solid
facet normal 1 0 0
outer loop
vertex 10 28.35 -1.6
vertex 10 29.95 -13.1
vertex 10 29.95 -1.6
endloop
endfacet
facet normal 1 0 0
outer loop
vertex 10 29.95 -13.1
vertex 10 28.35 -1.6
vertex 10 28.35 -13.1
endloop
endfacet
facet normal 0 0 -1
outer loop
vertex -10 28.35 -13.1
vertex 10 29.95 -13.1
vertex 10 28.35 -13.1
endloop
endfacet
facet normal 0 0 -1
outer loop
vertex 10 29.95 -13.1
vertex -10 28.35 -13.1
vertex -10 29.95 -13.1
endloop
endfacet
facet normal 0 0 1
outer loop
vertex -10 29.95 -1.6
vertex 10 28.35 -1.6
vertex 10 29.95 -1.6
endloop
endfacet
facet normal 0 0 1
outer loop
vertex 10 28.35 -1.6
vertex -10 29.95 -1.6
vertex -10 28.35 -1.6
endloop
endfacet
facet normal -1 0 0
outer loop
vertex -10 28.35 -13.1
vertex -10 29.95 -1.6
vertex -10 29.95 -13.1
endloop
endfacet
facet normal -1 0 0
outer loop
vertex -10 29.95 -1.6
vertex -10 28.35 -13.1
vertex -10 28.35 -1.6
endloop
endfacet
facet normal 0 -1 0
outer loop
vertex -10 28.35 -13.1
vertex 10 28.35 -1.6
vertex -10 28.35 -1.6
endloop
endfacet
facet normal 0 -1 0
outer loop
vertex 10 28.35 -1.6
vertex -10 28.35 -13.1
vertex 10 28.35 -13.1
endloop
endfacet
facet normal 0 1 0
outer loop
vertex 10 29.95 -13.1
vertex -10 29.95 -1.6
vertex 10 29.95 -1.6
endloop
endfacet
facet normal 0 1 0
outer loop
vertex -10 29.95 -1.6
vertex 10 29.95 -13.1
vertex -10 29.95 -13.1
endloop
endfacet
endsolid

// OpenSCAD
    // MixTape 3d Printed Case///////////////////////////

plugHeight = 10.5; // [6:10]
tapeHeight = 11.5; //
topThickness = 2; 

usb_charger = false;
front_charger = false;
cutout_aux_ports = true;

rotate([180,0,$t*380]) translate([-50,-30,0]){

//PCB();
//parts();

difference(){
    
    FullCase();
    
    // Plugs 
    translate([2.5,50,tapeHeight-plugHeight+topThickness]) cube([13,20,plugHeight+1],false); 
    translate([83.5,50,tapeHeight-plugHeight+topThickness]) cube([13,20,plugHeight+1],false);
    
    // write protectors 
    translate([10,0,0.5*tapeHeight+1.6]) cube([4,1,4],true);
    translate([14,0,0.5*tapeHeight+1.6]) cube([4,3,4],true);
    translate([89,0,0.5*tapeHeight+1.6]) cube([4,1,4],true);
    translate([85,0,0.5*tapeHeight+1.6]) cube([4,3,4],true);

    // 
    if (!front_charger) {
        
    }

    // Power signs
    if (front_charger) {
        translate([41,0,0.5*tapeHeight+1.6]) cube([4,1.5,1],true);
        translate([41,0,0.5*tapeHeight+1.6]) cube([1,1.5,4],true);
    
        translate([58,0,0.5*tapeHeight+1.6]) cube([4,1.5,1],true); 
    }
}
}

module FullCase(){
    tapeBody();
    tapeTop();
}


// Modules ///////////////////////////////

module PCB(){
 color("DarkKhaki") 
    translate ([0,0,tapeHeight+1.6]) linear_extrude(height = 1.6, center = false, convexity = 10, twist = 0) import("mixtape_case_3D_bottom.dxf", convexity=3);
 color("Gold") 
     translate ([0,0,tapeHeight+3.2]) linear_extrude(height = 0.2, center = false, convexity = 10, twist = 0) import("mixtape_case_3D_PCB.dxf", convexity=3);
    
 color("DarkKhaki") 
    translate ([0,0,tapeHeight+2*topThickness]) linear_extrude(height = 1.6, center = false, convexity = 10, twist = 0) import("mixtape_case_3D_PCB_TrapezBoard.dxf", convexity=3);
 color("Gold") 
     translate ([0,0,tapeHeight+3*topThickness]) linear_extrude(height = 0.2, center = false, convexity = 10, twist = 0) import("mixtape_case_3D_PCB_TrapezCircuit.dxf", convexity=3);
}

module tapeBody(){
   translate([40,0.05,1.6]) cube([20,1.6,tapeHeight+0],false); 
  difference(){ 
    //color("Deeppink") 
    translate ([0,0,1.6]) linear_extrude(height = tapeHeight, center = false, convexity = 10, twist = 0) import("mixtape_case_3D_bottom.dxf", convexity=3);  
    
    translate([11,50,0.7*tapeHeight+topThickness+3]) cube([8,12,0.7*tapeHeight],true);
    translate([88,50,0.7*tapeHeight+topThickness+3]) cube([8,12,0.7*tapeHeight],true);
      
     if (!usb_charger) {
        translate ([0,0,0.6]) linear_extrude(height = 15, center = false, convexity = 10, twist = 0) import("mixtape_case_3D_MainCase.dxf", convexity=3);
     } else {
         translate ([0,0,0.6]) linear_extrude(height = 15, center = false, convexity = 10, twist = 0) import("mixtape_case_3D_MainCase_USB.dxf", convexity=3);
     }
    
    //Face hole
    translate([25,64,0.5*tapeHeight+topThickness]) cube([12,2,0.7*tapeHeight],true);
    if (!usb_charger) { translate([49.5,64,0.5*tapeHeight+topThickness]) cube([16,2,0.7*tapeHeight],true); }
    translate([74.3,64,0.5*tapeHeight+topThickness]) cube([12,2,0.7*tapeHeight],true);
      
    translate([36,65,0.5*tapeHeight+topThickness]) cube([4,2,0.6*tapeHeight],true);
    translate([63,65,0.5*tapeHeight+topThickness]) cube([4,2,0.6*tapeHeight],true);
    
    if (usb_charger) {
        // cutout usb port
        #translate([49.5,64,0.5*tapeHeight+topThickness+tapeHeight-3]) cube([20,10,0.7*tapeHeight+4],true);
    }
    if (cutout_aux_ports) {
        translate([1.5,21.5,0.7*tapeHeight+topThickness+3]) cube([20,12,0.5*tapeHeight],true);
        translate([90,21.5,0.7*tapeHeight+topThickness+3]) cube([20,12,0.5*tapeHeight],true);      
    }
    
    // Battery space
    translate([3,2,1.6]) cube([93,46,tapeHeight+1],false);
    translate([17.5,42.4,1.6]) cube([64,20,tapeHeight+1],false);
    
  }
  
  
  //color("DarkKhaki") 
  if (usb_charger) {
    //translate([40,0.05,1.6]) cube([20,1.6,tapeHeight-0],false);
  }
}

module tapeTop(){ 
 
difference(){ 
 color("Deeppink") 
     translate ([0,0,-1.5]) linear_extrude(height = 1.5, center = false, convexity = 10, twist = 0) import("mixtape_case_3D_TopTrapez.dxf", convexity=3);
     
   color("Gold") 
     translate ([0,0,-2.2]) linear_extrude(height = 3, center = false, convexity = 10, twist = 0) import("mixtape_case_3D_Holes.dxf", convexity=3);
   translate([50,53,-2.2]) cylinder(h=1.2, r=1.3, center=false, ,$fn=30);
}   
    

difference(){    
  color("Deeppink") 
     translate ([0,0,0]) linear_extrude(height = 1.6, center = false, convexity = 10, twist = 0) import("mixtape_case_3D_bottom.dxf", convexity=3);

  translate([4,3,-1]) cylinder(h=1.5, r=1.3, center=false, ,$fn=30);
  translate([95,3,-1]) cylinder(h=1.5, r=1.3, center=false, ,$fn=30);
  translate([4,61,-1]) cylinder(h=1.5, r=1.3, center=false, ,$fn=30);
  translate([95,61,-1]) cylinder(h=1.5, r=1.3, center=false, ,$fn=30);
    
  color("Pink") 
     translate ([0,0,-1.3]) linear_extrude(height = 2, center = false, convexity = 10, twist = 0) import("mixtape_case_3D_WindowRect.dxf", convexity=3); 
    
  difference(){    
  color("Gold") 
     translate ([0,0,-0.5]) linear_extrude(height = 1, center = false, convexity = 10, twist = 0) import("mixtape_case_3D_BigRect.dxf", convexity=3);  
  

  translate ([0,0,-3]) linear_extrude(height = 10, center = false, convexity = 10, twist = 0) import("mixtape_case_3D_MidRect.dxf", convexity=3);   
  }
  
  translate ([0,0,-3]) linear_extrude(height = 5.5, center = false, convexity = 10, twist = 0) import("mixtape_case_3D_Wheels.dxf", convexity=3); 
}

  translate ([0,0,0.4]) linear_extrude(height = 1.2, center = false, convexity = 10, twist = 0) import("mixtape_case_3D_NutWheels.dxf", convexity=3); 

}
 

module parts(){
    // IC-Socket
  color("Grey")
      translate([44,22.5,tapeHeight+2*topThickness]) cube([11,13,4],false);
    
  difference(){
  color("Black")
      translate([45,23.5,tapeHeight+2*topThickness]) cube([9,11,7],false);
        
    translate([49.5,34.5,tapeHeight+2*topThickness+6]) cylinder(h=10, r=1.5, center=false, ,$fn=30);
    }
    
    // NEO-Pixels
    for (a = [ 0 : 6.3 : 46 ])
    translate([a,0,0]) NEOpixel();
    
    module NEOpixel(){
    color("White")
      translate([25.2,52.5,tapeHeight+3*topThickness]) cube([5,5,2],false);
        
    color("Deeppink")
      translate([27.7,55,tapeHeight+3*topThickness]) cylinder(h=2.5, r=2, center=false, ,$fn=30);
    }
    
    // Pots
    potentiometer();
    translate ([42,0,0]) potentiometer();
    
    module potentiometer(){
    color("Grey")
      translate([29,29,tapeHeight+2*topThickness]) cylinder(h=10, r=3.5, center=false, ,$fn=30);
    
    color("Deeppink")
        translate([29,29,tapeHeight+2*topThickness+2]) cylinder(h=12, r1=6, r2=4.5, center=false, ,$fn=30);
    }
    
    // Buttons
    button();
    translate ([58,0,0]) button();
    
    module button(){
    color("Grey")
      translate([17.5,9.8,tapeHeight+2*topThickness]) cube([6,6,3],false);
        
    color("Red")
      translate([20.5,12.8,tapeHeight+2*topThickness]) cylinder(h=5, r=1.5, center=false, ,$fn=30);
    }

}
